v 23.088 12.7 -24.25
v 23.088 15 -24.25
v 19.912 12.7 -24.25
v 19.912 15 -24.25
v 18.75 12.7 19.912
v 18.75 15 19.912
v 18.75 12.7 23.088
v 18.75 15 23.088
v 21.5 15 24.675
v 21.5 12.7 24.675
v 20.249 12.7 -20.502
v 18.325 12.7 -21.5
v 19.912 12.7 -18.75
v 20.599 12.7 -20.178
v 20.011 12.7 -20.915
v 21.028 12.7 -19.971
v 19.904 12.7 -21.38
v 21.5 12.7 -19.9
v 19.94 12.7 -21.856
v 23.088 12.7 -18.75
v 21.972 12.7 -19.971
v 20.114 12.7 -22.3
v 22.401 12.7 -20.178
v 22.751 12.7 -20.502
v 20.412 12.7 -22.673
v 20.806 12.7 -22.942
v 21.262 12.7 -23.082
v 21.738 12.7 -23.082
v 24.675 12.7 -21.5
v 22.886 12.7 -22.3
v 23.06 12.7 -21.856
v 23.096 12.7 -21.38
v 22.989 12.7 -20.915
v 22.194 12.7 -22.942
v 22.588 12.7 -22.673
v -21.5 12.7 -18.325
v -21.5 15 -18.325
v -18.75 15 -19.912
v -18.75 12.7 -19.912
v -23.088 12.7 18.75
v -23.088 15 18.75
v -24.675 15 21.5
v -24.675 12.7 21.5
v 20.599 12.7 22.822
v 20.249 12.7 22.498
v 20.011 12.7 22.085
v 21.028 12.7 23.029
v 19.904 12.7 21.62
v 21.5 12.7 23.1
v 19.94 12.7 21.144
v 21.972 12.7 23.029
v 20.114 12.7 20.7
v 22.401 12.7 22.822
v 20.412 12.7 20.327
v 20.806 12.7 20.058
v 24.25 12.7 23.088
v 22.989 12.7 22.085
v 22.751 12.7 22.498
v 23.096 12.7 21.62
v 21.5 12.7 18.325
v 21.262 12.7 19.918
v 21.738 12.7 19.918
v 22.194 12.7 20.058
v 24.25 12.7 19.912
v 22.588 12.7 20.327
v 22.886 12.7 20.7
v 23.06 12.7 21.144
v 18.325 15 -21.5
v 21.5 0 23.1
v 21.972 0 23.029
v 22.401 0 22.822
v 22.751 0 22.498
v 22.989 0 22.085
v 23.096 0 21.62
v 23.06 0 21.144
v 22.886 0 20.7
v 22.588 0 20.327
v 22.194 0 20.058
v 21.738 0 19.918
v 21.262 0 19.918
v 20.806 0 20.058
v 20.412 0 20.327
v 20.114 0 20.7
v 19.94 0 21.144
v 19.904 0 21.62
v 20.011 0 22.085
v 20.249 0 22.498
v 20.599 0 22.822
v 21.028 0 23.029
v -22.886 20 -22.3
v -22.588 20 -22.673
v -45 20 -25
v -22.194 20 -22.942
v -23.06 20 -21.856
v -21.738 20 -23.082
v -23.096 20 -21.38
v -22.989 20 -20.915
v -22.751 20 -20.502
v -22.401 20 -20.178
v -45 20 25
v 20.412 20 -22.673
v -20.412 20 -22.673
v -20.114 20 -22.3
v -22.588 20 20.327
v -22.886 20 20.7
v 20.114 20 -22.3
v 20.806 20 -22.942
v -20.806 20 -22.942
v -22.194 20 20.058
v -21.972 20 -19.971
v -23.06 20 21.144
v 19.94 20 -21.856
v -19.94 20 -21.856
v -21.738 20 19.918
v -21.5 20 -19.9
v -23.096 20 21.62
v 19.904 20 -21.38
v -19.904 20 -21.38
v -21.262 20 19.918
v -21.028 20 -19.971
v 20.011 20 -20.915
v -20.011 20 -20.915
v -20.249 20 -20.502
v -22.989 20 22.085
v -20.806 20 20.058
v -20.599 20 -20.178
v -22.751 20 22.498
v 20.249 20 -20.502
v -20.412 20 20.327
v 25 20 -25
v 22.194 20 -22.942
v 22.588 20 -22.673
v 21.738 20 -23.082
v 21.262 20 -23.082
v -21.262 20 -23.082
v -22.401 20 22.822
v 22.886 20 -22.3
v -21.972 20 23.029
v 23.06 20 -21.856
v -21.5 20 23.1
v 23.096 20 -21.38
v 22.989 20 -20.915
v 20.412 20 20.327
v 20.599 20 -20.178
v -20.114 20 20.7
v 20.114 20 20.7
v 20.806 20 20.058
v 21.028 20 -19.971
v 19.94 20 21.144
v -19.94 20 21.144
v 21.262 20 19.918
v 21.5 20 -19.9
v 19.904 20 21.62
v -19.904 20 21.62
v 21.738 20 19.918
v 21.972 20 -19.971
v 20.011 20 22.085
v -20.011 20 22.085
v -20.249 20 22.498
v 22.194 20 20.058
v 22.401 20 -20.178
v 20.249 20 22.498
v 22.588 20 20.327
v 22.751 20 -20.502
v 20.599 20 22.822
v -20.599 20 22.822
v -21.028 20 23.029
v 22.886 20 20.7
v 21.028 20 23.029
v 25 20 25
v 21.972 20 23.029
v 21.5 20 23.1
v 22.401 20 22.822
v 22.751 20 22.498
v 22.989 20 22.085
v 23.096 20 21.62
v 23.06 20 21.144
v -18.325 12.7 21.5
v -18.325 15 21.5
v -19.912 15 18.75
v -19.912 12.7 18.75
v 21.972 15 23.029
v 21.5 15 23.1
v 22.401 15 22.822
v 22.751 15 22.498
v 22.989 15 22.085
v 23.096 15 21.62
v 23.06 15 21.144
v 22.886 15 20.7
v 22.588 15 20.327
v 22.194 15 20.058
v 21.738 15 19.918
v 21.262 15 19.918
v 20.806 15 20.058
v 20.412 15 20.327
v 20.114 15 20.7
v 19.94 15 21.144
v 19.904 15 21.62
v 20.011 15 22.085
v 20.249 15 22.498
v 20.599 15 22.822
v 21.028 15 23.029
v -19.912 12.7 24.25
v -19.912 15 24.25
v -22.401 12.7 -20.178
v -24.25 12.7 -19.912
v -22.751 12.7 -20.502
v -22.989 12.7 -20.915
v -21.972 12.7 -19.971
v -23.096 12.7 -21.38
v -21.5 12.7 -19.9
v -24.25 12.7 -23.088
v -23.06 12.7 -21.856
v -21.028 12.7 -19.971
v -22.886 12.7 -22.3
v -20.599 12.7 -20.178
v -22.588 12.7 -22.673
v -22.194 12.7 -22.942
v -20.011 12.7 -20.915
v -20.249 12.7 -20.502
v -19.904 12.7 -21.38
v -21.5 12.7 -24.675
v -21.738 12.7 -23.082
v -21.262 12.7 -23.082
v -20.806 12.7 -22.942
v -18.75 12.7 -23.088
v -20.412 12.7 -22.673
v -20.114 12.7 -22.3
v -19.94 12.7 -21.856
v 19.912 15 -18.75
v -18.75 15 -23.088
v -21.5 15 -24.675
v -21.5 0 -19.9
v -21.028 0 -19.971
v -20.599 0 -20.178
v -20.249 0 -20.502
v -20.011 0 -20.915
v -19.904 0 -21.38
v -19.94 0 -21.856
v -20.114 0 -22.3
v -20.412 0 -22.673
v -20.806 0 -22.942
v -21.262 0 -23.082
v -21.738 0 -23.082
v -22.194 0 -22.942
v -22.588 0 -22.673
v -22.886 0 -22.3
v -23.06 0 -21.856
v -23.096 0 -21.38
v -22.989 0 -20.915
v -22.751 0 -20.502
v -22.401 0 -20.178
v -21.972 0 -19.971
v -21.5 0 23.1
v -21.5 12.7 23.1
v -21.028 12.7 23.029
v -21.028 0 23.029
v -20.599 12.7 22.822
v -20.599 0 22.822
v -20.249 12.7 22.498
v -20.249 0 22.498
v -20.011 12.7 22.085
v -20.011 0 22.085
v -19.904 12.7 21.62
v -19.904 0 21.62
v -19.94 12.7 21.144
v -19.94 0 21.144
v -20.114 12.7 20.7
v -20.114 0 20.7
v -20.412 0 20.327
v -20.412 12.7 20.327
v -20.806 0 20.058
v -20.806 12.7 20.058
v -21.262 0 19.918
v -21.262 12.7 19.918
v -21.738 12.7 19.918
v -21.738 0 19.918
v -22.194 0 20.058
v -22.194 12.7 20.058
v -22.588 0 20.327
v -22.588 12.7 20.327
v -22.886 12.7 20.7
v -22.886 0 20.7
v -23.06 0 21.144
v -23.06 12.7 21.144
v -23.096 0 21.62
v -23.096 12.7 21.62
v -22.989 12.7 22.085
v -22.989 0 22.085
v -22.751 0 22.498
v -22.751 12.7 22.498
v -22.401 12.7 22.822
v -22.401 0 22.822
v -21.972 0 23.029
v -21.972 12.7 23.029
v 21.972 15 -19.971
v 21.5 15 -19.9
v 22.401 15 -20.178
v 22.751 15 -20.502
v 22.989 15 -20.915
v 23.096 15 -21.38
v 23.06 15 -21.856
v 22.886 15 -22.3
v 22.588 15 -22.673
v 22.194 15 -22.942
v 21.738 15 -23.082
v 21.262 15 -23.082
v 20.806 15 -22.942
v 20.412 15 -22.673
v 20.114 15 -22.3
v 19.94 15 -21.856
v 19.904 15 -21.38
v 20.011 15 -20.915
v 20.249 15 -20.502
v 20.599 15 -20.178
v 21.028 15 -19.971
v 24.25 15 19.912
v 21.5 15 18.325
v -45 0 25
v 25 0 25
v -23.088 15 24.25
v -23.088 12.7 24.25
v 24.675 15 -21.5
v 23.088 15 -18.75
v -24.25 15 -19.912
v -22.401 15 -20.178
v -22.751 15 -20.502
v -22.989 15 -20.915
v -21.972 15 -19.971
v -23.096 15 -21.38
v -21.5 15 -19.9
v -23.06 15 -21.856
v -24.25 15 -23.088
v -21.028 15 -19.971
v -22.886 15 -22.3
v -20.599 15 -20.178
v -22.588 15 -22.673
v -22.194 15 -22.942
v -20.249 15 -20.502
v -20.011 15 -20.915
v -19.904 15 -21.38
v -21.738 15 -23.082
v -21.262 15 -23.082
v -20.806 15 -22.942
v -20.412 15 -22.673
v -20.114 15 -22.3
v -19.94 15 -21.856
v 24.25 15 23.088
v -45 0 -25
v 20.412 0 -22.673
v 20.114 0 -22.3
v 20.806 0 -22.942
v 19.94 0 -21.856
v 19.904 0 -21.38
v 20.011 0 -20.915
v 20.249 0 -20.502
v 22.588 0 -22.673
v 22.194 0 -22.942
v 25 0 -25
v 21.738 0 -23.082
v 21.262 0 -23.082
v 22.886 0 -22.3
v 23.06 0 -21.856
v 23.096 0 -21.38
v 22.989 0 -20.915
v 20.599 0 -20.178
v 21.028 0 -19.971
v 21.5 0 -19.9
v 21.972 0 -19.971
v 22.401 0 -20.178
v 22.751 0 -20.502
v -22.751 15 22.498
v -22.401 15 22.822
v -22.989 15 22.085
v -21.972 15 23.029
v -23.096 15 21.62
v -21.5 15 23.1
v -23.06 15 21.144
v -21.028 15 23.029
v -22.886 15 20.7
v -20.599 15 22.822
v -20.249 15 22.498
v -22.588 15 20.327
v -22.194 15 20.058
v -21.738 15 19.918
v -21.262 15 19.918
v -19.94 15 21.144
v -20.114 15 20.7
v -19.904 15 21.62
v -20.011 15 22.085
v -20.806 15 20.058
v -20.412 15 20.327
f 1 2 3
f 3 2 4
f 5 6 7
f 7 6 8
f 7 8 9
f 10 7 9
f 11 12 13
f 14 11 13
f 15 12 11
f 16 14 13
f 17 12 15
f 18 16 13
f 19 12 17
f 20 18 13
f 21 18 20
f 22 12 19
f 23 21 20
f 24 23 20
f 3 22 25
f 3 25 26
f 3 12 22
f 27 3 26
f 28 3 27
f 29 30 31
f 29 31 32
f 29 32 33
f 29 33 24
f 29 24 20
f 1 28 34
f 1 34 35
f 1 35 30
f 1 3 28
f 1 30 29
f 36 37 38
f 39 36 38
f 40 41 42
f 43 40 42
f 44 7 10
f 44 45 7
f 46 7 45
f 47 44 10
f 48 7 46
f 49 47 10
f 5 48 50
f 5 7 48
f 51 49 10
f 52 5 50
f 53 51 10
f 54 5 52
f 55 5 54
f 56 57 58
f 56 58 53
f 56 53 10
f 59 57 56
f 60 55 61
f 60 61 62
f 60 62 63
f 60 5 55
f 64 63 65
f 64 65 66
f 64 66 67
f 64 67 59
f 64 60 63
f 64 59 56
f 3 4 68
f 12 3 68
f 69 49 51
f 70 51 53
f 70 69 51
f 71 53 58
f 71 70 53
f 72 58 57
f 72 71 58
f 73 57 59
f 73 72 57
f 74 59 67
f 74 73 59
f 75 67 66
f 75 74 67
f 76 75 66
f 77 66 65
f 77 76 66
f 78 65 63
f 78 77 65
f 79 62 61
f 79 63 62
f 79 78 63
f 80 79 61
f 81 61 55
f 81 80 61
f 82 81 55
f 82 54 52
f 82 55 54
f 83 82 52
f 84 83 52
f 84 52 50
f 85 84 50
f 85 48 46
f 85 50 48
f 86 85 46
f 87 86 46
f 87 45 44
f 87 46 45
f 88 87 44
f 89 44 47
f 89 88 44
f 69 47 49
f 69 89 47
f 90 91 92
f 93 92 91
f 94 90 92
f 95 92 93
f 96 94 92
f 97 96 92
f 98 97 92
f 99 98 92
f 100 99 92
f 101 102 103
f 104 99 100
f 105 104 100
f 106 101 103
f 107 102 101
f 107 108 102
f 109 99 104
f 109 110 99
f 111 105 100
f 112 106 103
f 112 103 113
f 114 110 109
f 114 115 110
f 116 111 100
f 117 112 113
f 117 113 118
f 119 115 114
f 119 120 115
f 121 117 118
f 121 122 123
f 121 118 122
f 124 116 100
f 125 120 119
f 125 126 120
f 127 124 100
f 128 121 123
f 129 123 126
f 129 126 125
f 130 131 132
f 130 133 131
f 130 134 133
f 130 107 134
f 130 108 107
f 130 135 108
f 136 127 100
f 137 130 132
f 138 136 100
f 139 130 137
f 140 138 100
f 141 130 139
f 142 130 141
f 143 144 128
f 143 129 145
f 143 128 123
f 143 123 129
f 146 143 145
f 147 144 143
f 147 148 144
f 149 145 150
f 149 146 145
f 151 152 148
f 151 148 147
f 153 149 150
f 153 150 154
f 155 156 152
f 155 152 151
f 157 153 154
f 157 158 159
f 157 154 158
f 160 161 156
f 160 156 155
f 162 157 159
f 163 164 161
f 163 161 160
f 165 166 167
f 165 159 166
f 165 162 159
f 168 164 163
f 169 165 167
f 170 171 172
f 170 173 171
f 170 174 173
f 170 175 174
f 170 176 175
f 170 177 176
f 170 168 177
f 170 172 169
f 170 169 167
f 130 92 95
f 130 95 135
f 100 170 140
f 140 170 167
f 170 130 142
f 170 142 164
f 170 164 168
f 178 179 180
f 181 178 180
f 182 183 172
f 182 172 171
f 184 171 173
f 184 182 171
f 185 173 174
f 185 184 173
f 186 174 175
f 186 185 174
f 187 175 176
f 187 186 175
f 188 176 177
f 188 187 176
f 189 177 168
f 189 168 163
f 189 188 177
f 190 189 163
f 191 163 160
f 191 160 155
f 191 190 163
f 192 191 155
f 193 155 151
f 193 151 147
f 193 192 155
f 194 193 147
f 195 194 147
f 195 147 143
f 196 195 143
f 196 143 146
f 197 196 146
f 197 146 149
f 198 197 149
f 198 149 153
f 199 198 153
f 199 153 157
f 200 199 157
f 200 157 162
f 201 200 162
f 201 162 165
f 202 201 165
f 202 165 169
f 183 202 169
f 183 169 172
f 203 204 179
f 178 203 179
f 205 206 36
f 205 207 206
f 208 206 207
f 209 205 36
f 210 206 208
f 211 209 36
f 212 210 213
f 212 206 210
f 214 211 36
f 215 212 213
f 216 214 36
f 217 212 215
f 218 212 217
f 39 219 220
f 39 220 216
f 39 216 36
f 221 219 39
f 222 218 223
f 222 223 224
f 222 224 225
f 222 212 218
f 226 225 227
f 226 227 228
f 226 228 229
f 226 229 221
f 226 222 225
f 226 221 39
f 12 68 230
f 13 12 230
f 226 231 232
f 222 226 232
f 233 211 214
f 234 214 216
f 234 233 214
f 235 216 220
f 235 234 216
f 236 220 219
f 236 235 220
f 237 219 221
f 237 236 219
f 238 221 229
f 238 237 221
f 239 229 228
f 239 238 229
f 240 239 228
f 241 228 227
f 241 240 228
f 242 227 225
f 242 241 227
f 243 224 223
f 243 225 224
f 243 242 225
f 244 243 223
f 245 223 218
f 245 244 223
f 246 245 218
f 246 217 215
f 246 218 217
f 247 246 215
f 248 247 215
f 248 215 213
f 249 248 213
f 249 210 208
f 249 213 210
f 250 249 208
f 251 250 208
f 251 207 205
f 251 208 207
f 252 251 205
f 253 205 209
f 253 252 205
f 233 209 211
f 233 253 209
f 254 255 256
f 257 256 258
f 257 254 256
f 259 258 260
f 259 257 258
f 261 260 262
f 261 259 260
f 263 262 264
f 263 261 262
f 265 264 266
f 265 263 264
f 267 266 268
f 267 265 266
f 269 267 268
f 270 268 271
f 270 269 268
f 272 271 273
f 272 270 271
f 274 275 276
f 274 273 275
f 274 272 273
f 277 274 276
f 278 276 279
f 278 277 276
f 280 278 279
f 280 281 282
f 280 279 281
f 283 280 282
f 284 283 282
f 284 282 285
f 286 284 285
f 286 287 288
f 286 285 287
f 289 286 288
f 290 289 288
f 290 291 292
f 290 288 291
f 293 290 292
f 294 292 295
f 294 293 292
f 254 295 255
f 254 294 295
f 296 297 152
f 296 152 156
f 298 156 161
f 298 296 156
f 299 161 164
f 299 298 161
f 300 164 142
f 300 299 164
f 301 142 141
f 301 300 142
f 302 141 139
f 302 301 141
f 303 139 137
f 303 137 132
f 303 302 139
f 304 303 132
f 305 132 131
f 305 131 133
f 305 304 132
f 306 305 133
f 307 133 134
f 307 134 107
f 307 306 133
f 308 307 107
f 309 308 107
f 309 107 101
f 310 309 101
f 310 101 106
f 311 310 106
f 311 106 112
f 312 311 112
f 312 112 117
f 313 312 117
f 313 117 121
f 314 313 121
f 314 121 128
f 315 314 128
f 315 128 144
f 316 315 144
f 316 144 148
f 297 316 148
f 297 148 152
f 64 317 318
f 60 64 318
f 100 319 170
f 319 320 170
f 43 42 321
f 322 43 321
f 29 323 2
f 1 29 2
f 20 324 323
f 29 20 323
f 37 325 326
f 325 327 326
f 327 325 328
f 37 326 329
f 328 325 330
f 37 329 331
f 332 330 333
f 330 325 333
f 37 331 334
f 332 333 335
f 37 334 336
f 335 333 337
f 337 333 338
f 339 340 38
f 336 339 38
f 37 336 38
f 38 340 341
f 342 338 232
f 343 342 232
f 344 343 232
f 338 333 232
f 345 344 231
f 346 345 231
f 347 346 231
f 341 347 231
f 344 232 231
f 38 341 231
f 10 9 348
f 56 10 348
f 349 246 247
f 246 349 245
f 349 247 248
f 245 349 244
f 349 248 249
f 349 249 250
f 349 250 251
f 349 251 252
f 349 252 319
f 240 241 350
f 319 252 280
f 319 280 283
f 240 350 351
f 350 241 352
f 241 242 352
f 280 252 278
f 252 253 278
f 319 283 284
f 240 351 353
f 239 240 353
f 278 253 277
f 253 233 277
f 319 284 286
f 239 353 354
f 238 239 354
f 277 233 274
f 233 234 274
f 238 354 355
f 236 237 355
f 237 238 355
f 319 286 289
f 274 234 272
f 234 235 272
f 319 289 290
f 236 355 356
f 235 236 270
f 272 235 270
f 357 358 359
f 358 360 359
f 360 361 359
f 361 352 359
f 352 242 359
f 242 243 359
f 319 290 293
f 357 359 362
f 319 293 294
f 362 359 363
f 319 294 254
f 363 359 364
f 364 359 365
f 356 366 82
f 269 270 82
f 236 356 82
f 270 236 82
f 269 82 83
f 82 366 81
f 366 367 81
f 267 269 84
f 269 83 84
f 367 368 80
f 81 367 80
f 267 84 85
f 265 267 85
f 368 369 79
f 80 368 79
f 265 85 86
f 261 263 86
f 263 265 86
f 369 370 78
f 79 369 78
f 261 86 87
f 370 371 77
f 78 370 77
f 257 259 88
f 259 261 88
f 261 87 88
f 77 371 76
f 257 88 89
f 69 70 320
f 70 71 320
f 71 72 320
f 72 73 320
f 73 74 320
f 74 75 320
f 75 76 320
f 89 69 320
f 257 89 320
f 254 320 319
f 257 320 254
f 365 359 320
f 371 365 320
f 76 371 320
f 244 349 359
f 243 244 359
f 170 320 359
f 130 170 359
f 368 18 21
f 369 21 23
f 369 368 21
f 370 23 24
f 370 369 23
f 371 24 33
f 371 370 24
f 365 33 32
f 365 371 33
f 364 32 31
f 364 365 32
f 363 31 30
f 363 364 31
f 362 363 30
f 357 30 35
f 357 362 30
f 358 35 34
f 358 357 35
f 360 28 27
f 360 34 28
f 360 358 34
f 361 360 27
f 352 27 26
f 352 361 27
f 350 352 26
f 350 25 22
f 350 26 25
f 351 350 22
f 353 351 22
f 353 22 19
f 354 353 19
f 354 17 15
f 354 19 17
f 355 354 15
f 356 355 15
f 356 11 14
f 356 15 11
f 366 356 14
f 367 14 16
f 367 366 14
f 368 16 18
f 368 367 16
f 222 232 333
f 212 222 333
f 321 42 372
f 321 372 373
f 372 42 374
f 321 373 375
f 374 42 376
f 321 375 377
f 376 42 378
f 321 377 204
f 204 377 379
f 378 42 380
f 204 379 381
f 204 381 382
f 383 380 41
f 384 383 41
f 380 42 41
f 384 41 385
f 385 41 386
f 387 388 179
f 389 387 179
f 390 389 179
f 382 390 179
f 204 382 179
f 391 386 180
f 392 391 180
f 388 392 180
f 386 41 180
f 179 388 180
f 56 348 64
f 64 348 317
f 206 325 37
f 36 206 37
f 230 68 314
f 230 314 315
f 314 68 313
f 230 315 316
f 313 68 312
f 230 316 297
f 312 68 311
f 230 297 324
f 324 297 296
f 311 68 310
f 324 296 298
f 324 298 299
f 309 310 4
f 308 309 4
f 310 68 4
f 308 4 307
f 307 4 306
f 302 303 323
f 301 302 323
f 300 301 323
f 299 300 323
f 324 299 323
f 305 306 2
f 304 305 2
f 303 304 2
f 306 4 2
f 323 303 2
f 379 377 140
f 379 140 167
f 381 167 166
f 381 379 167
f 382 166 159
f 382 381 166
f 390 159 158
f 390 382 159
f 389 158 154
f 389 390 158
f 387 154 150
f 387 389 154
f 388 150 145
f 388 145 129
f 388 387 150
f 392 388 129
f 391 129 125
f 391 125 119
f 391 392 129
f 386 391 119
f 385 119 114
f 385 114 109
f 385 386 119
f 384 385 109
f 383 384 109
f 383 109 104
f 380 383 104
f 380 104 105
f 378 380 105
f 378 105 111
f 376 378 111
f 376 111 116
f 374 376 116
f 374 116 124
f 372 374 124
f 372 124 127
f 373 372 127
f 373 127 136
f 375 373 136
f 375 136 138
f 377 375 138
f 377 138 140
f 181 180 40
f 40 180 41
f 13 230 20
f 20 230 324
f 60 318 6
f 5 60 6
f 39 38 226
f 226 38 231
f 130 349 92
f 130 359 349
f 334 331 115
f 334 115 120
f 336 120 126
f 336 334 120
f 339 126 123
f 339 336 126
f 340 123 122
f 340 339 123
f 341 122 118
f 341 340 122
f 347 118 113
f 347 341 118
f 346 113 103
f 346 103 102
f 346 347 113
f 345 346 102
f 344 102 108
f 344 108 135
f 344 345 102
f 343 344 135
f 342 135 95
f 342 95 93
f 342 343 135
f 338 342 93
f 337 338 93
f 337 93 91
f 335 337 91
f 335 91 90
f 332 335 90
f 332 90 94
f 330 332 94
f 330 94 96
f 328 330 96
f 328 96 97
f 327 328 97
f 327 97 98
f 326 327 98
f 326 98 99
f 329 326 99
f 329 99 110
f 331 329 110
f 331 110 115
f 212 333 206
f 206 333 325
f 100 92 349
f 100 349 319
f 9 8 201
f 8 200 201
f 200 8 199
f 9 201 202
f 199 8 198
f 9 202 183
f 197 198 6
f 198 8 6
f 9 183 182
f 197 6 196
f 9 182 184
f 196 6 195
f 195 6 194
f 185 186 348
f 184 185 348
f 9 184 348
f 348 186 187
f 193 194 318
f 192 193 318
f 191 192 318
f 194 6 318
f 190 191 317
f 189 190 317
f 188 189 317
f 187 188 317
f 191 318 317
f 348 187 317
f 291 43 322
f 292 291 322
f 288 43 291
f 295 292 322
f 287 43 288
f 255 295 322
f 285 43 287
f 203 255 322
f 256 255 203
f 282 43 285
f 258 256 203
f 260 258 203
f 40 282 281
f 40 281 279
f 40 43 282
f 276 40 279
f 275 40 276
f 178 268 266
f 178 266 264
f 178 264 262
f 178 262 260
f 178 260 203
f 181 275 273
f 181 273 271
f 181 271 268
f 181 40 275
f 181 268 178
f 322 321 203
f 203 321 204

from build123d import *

# Parameters (mm, degrees)
SKETCH1_W           = 50
SKETCH1_H           = 50
SKETCH1_R           = 1.6
BOSS_EXTRUDE1_DEPTH = 20
CUT_EXTRUDE1_START  = -5
CUT_EXTRUDE1_DEPTH  = 2.3
SKETCH3_W           = 50
SKETCH3_H           = 20
BOSS_EXTRUDE2_DEPTH = 20


with BuildPart() as part:
    # Sketch1 → Boss-Extrude1 (new body)
    with BuildSketch(Plane(origin=(0, 0, 0), x_dir=(1, 0, 0), z_dir=(0, 1, 0))):
        Rectangle(SKETCH1_W, SKETCH1_H)
        with Locations(Location((21.5, 21.5, 0), (0, 0, 270))):
            Circle(SKETCH1_R, mode=Mode.SUBTRACT)
        with Locations(Location((21.5, -21.5, 0), (0, 0, 270))):
            Circle(SKETCH1_R, mode=Mode.SUBTRACT)
        with Locations(Location((-21.5, -21.5, 0), (0, 0, 270))):
            Circle(SKETCH1_R, mode=Mode.SUBTRACT)
        with Locations(Location((-21.5, 21.5, 0), (0, 0, 270))):
            Circle(SKETCH1_R, mode=Mode.SUBTRACT)
    extrude(amount=BOSS_EXTRUDE1_DEPTH)

    # Sketch2 → Cut-Extrude1 (cut)
    with BuildSketch(Plane(origin=(0, 20, 0), x_dir=(1, 0, 0), z_dir=(0, 1, 0)).offset(CUT_EXTRUDE1_START)):
        Polygon((24.675426481, 21.5), (23.08771324, 24.25), (19.91228676, 24.25), (18.324573519, 21.5), (19.91228676, 18.75), (23.08771324, 18.75), align=None)
        Polygon((-21.5, 24.675426481), (-24.25, 23.08771324), (-24.25, 19.91228676), (-21.5, 18.324573519), (-18.75, 19.91228676), (-18.75, 23.08771324), align=None)
        Polygon((21.5, -24.675426481), (24.25, -23.08771324), (24.25, -19.91228676), (21.5, -18.324573519), (18.75, -19.91228676), (18.75, -23.08771324), align=None)
        Polygon((-24.675426481, -21.5), (-23.08771324, -24.25), (-19.91228676, -24.25), (-18.324573519, -21.5), (-19.91228676, -18.75), (-23.08771324, -18.75), align=None)
    extrude(amount=-CUT_EXTRUDE1_DEPTH, mode=Mode.SUBTRACT)

    # Sketch3 → Boss-Extrude2 (add)
    with BuildSketch(Plane.ZY.offset(25)):
        with Locations((0, 10)):
            Rectangle(SKETCH3_W, SKETCH3_H)
    extrude(amount=BOSS_EXTRUDE2_DEPTH)


solid = part.part
